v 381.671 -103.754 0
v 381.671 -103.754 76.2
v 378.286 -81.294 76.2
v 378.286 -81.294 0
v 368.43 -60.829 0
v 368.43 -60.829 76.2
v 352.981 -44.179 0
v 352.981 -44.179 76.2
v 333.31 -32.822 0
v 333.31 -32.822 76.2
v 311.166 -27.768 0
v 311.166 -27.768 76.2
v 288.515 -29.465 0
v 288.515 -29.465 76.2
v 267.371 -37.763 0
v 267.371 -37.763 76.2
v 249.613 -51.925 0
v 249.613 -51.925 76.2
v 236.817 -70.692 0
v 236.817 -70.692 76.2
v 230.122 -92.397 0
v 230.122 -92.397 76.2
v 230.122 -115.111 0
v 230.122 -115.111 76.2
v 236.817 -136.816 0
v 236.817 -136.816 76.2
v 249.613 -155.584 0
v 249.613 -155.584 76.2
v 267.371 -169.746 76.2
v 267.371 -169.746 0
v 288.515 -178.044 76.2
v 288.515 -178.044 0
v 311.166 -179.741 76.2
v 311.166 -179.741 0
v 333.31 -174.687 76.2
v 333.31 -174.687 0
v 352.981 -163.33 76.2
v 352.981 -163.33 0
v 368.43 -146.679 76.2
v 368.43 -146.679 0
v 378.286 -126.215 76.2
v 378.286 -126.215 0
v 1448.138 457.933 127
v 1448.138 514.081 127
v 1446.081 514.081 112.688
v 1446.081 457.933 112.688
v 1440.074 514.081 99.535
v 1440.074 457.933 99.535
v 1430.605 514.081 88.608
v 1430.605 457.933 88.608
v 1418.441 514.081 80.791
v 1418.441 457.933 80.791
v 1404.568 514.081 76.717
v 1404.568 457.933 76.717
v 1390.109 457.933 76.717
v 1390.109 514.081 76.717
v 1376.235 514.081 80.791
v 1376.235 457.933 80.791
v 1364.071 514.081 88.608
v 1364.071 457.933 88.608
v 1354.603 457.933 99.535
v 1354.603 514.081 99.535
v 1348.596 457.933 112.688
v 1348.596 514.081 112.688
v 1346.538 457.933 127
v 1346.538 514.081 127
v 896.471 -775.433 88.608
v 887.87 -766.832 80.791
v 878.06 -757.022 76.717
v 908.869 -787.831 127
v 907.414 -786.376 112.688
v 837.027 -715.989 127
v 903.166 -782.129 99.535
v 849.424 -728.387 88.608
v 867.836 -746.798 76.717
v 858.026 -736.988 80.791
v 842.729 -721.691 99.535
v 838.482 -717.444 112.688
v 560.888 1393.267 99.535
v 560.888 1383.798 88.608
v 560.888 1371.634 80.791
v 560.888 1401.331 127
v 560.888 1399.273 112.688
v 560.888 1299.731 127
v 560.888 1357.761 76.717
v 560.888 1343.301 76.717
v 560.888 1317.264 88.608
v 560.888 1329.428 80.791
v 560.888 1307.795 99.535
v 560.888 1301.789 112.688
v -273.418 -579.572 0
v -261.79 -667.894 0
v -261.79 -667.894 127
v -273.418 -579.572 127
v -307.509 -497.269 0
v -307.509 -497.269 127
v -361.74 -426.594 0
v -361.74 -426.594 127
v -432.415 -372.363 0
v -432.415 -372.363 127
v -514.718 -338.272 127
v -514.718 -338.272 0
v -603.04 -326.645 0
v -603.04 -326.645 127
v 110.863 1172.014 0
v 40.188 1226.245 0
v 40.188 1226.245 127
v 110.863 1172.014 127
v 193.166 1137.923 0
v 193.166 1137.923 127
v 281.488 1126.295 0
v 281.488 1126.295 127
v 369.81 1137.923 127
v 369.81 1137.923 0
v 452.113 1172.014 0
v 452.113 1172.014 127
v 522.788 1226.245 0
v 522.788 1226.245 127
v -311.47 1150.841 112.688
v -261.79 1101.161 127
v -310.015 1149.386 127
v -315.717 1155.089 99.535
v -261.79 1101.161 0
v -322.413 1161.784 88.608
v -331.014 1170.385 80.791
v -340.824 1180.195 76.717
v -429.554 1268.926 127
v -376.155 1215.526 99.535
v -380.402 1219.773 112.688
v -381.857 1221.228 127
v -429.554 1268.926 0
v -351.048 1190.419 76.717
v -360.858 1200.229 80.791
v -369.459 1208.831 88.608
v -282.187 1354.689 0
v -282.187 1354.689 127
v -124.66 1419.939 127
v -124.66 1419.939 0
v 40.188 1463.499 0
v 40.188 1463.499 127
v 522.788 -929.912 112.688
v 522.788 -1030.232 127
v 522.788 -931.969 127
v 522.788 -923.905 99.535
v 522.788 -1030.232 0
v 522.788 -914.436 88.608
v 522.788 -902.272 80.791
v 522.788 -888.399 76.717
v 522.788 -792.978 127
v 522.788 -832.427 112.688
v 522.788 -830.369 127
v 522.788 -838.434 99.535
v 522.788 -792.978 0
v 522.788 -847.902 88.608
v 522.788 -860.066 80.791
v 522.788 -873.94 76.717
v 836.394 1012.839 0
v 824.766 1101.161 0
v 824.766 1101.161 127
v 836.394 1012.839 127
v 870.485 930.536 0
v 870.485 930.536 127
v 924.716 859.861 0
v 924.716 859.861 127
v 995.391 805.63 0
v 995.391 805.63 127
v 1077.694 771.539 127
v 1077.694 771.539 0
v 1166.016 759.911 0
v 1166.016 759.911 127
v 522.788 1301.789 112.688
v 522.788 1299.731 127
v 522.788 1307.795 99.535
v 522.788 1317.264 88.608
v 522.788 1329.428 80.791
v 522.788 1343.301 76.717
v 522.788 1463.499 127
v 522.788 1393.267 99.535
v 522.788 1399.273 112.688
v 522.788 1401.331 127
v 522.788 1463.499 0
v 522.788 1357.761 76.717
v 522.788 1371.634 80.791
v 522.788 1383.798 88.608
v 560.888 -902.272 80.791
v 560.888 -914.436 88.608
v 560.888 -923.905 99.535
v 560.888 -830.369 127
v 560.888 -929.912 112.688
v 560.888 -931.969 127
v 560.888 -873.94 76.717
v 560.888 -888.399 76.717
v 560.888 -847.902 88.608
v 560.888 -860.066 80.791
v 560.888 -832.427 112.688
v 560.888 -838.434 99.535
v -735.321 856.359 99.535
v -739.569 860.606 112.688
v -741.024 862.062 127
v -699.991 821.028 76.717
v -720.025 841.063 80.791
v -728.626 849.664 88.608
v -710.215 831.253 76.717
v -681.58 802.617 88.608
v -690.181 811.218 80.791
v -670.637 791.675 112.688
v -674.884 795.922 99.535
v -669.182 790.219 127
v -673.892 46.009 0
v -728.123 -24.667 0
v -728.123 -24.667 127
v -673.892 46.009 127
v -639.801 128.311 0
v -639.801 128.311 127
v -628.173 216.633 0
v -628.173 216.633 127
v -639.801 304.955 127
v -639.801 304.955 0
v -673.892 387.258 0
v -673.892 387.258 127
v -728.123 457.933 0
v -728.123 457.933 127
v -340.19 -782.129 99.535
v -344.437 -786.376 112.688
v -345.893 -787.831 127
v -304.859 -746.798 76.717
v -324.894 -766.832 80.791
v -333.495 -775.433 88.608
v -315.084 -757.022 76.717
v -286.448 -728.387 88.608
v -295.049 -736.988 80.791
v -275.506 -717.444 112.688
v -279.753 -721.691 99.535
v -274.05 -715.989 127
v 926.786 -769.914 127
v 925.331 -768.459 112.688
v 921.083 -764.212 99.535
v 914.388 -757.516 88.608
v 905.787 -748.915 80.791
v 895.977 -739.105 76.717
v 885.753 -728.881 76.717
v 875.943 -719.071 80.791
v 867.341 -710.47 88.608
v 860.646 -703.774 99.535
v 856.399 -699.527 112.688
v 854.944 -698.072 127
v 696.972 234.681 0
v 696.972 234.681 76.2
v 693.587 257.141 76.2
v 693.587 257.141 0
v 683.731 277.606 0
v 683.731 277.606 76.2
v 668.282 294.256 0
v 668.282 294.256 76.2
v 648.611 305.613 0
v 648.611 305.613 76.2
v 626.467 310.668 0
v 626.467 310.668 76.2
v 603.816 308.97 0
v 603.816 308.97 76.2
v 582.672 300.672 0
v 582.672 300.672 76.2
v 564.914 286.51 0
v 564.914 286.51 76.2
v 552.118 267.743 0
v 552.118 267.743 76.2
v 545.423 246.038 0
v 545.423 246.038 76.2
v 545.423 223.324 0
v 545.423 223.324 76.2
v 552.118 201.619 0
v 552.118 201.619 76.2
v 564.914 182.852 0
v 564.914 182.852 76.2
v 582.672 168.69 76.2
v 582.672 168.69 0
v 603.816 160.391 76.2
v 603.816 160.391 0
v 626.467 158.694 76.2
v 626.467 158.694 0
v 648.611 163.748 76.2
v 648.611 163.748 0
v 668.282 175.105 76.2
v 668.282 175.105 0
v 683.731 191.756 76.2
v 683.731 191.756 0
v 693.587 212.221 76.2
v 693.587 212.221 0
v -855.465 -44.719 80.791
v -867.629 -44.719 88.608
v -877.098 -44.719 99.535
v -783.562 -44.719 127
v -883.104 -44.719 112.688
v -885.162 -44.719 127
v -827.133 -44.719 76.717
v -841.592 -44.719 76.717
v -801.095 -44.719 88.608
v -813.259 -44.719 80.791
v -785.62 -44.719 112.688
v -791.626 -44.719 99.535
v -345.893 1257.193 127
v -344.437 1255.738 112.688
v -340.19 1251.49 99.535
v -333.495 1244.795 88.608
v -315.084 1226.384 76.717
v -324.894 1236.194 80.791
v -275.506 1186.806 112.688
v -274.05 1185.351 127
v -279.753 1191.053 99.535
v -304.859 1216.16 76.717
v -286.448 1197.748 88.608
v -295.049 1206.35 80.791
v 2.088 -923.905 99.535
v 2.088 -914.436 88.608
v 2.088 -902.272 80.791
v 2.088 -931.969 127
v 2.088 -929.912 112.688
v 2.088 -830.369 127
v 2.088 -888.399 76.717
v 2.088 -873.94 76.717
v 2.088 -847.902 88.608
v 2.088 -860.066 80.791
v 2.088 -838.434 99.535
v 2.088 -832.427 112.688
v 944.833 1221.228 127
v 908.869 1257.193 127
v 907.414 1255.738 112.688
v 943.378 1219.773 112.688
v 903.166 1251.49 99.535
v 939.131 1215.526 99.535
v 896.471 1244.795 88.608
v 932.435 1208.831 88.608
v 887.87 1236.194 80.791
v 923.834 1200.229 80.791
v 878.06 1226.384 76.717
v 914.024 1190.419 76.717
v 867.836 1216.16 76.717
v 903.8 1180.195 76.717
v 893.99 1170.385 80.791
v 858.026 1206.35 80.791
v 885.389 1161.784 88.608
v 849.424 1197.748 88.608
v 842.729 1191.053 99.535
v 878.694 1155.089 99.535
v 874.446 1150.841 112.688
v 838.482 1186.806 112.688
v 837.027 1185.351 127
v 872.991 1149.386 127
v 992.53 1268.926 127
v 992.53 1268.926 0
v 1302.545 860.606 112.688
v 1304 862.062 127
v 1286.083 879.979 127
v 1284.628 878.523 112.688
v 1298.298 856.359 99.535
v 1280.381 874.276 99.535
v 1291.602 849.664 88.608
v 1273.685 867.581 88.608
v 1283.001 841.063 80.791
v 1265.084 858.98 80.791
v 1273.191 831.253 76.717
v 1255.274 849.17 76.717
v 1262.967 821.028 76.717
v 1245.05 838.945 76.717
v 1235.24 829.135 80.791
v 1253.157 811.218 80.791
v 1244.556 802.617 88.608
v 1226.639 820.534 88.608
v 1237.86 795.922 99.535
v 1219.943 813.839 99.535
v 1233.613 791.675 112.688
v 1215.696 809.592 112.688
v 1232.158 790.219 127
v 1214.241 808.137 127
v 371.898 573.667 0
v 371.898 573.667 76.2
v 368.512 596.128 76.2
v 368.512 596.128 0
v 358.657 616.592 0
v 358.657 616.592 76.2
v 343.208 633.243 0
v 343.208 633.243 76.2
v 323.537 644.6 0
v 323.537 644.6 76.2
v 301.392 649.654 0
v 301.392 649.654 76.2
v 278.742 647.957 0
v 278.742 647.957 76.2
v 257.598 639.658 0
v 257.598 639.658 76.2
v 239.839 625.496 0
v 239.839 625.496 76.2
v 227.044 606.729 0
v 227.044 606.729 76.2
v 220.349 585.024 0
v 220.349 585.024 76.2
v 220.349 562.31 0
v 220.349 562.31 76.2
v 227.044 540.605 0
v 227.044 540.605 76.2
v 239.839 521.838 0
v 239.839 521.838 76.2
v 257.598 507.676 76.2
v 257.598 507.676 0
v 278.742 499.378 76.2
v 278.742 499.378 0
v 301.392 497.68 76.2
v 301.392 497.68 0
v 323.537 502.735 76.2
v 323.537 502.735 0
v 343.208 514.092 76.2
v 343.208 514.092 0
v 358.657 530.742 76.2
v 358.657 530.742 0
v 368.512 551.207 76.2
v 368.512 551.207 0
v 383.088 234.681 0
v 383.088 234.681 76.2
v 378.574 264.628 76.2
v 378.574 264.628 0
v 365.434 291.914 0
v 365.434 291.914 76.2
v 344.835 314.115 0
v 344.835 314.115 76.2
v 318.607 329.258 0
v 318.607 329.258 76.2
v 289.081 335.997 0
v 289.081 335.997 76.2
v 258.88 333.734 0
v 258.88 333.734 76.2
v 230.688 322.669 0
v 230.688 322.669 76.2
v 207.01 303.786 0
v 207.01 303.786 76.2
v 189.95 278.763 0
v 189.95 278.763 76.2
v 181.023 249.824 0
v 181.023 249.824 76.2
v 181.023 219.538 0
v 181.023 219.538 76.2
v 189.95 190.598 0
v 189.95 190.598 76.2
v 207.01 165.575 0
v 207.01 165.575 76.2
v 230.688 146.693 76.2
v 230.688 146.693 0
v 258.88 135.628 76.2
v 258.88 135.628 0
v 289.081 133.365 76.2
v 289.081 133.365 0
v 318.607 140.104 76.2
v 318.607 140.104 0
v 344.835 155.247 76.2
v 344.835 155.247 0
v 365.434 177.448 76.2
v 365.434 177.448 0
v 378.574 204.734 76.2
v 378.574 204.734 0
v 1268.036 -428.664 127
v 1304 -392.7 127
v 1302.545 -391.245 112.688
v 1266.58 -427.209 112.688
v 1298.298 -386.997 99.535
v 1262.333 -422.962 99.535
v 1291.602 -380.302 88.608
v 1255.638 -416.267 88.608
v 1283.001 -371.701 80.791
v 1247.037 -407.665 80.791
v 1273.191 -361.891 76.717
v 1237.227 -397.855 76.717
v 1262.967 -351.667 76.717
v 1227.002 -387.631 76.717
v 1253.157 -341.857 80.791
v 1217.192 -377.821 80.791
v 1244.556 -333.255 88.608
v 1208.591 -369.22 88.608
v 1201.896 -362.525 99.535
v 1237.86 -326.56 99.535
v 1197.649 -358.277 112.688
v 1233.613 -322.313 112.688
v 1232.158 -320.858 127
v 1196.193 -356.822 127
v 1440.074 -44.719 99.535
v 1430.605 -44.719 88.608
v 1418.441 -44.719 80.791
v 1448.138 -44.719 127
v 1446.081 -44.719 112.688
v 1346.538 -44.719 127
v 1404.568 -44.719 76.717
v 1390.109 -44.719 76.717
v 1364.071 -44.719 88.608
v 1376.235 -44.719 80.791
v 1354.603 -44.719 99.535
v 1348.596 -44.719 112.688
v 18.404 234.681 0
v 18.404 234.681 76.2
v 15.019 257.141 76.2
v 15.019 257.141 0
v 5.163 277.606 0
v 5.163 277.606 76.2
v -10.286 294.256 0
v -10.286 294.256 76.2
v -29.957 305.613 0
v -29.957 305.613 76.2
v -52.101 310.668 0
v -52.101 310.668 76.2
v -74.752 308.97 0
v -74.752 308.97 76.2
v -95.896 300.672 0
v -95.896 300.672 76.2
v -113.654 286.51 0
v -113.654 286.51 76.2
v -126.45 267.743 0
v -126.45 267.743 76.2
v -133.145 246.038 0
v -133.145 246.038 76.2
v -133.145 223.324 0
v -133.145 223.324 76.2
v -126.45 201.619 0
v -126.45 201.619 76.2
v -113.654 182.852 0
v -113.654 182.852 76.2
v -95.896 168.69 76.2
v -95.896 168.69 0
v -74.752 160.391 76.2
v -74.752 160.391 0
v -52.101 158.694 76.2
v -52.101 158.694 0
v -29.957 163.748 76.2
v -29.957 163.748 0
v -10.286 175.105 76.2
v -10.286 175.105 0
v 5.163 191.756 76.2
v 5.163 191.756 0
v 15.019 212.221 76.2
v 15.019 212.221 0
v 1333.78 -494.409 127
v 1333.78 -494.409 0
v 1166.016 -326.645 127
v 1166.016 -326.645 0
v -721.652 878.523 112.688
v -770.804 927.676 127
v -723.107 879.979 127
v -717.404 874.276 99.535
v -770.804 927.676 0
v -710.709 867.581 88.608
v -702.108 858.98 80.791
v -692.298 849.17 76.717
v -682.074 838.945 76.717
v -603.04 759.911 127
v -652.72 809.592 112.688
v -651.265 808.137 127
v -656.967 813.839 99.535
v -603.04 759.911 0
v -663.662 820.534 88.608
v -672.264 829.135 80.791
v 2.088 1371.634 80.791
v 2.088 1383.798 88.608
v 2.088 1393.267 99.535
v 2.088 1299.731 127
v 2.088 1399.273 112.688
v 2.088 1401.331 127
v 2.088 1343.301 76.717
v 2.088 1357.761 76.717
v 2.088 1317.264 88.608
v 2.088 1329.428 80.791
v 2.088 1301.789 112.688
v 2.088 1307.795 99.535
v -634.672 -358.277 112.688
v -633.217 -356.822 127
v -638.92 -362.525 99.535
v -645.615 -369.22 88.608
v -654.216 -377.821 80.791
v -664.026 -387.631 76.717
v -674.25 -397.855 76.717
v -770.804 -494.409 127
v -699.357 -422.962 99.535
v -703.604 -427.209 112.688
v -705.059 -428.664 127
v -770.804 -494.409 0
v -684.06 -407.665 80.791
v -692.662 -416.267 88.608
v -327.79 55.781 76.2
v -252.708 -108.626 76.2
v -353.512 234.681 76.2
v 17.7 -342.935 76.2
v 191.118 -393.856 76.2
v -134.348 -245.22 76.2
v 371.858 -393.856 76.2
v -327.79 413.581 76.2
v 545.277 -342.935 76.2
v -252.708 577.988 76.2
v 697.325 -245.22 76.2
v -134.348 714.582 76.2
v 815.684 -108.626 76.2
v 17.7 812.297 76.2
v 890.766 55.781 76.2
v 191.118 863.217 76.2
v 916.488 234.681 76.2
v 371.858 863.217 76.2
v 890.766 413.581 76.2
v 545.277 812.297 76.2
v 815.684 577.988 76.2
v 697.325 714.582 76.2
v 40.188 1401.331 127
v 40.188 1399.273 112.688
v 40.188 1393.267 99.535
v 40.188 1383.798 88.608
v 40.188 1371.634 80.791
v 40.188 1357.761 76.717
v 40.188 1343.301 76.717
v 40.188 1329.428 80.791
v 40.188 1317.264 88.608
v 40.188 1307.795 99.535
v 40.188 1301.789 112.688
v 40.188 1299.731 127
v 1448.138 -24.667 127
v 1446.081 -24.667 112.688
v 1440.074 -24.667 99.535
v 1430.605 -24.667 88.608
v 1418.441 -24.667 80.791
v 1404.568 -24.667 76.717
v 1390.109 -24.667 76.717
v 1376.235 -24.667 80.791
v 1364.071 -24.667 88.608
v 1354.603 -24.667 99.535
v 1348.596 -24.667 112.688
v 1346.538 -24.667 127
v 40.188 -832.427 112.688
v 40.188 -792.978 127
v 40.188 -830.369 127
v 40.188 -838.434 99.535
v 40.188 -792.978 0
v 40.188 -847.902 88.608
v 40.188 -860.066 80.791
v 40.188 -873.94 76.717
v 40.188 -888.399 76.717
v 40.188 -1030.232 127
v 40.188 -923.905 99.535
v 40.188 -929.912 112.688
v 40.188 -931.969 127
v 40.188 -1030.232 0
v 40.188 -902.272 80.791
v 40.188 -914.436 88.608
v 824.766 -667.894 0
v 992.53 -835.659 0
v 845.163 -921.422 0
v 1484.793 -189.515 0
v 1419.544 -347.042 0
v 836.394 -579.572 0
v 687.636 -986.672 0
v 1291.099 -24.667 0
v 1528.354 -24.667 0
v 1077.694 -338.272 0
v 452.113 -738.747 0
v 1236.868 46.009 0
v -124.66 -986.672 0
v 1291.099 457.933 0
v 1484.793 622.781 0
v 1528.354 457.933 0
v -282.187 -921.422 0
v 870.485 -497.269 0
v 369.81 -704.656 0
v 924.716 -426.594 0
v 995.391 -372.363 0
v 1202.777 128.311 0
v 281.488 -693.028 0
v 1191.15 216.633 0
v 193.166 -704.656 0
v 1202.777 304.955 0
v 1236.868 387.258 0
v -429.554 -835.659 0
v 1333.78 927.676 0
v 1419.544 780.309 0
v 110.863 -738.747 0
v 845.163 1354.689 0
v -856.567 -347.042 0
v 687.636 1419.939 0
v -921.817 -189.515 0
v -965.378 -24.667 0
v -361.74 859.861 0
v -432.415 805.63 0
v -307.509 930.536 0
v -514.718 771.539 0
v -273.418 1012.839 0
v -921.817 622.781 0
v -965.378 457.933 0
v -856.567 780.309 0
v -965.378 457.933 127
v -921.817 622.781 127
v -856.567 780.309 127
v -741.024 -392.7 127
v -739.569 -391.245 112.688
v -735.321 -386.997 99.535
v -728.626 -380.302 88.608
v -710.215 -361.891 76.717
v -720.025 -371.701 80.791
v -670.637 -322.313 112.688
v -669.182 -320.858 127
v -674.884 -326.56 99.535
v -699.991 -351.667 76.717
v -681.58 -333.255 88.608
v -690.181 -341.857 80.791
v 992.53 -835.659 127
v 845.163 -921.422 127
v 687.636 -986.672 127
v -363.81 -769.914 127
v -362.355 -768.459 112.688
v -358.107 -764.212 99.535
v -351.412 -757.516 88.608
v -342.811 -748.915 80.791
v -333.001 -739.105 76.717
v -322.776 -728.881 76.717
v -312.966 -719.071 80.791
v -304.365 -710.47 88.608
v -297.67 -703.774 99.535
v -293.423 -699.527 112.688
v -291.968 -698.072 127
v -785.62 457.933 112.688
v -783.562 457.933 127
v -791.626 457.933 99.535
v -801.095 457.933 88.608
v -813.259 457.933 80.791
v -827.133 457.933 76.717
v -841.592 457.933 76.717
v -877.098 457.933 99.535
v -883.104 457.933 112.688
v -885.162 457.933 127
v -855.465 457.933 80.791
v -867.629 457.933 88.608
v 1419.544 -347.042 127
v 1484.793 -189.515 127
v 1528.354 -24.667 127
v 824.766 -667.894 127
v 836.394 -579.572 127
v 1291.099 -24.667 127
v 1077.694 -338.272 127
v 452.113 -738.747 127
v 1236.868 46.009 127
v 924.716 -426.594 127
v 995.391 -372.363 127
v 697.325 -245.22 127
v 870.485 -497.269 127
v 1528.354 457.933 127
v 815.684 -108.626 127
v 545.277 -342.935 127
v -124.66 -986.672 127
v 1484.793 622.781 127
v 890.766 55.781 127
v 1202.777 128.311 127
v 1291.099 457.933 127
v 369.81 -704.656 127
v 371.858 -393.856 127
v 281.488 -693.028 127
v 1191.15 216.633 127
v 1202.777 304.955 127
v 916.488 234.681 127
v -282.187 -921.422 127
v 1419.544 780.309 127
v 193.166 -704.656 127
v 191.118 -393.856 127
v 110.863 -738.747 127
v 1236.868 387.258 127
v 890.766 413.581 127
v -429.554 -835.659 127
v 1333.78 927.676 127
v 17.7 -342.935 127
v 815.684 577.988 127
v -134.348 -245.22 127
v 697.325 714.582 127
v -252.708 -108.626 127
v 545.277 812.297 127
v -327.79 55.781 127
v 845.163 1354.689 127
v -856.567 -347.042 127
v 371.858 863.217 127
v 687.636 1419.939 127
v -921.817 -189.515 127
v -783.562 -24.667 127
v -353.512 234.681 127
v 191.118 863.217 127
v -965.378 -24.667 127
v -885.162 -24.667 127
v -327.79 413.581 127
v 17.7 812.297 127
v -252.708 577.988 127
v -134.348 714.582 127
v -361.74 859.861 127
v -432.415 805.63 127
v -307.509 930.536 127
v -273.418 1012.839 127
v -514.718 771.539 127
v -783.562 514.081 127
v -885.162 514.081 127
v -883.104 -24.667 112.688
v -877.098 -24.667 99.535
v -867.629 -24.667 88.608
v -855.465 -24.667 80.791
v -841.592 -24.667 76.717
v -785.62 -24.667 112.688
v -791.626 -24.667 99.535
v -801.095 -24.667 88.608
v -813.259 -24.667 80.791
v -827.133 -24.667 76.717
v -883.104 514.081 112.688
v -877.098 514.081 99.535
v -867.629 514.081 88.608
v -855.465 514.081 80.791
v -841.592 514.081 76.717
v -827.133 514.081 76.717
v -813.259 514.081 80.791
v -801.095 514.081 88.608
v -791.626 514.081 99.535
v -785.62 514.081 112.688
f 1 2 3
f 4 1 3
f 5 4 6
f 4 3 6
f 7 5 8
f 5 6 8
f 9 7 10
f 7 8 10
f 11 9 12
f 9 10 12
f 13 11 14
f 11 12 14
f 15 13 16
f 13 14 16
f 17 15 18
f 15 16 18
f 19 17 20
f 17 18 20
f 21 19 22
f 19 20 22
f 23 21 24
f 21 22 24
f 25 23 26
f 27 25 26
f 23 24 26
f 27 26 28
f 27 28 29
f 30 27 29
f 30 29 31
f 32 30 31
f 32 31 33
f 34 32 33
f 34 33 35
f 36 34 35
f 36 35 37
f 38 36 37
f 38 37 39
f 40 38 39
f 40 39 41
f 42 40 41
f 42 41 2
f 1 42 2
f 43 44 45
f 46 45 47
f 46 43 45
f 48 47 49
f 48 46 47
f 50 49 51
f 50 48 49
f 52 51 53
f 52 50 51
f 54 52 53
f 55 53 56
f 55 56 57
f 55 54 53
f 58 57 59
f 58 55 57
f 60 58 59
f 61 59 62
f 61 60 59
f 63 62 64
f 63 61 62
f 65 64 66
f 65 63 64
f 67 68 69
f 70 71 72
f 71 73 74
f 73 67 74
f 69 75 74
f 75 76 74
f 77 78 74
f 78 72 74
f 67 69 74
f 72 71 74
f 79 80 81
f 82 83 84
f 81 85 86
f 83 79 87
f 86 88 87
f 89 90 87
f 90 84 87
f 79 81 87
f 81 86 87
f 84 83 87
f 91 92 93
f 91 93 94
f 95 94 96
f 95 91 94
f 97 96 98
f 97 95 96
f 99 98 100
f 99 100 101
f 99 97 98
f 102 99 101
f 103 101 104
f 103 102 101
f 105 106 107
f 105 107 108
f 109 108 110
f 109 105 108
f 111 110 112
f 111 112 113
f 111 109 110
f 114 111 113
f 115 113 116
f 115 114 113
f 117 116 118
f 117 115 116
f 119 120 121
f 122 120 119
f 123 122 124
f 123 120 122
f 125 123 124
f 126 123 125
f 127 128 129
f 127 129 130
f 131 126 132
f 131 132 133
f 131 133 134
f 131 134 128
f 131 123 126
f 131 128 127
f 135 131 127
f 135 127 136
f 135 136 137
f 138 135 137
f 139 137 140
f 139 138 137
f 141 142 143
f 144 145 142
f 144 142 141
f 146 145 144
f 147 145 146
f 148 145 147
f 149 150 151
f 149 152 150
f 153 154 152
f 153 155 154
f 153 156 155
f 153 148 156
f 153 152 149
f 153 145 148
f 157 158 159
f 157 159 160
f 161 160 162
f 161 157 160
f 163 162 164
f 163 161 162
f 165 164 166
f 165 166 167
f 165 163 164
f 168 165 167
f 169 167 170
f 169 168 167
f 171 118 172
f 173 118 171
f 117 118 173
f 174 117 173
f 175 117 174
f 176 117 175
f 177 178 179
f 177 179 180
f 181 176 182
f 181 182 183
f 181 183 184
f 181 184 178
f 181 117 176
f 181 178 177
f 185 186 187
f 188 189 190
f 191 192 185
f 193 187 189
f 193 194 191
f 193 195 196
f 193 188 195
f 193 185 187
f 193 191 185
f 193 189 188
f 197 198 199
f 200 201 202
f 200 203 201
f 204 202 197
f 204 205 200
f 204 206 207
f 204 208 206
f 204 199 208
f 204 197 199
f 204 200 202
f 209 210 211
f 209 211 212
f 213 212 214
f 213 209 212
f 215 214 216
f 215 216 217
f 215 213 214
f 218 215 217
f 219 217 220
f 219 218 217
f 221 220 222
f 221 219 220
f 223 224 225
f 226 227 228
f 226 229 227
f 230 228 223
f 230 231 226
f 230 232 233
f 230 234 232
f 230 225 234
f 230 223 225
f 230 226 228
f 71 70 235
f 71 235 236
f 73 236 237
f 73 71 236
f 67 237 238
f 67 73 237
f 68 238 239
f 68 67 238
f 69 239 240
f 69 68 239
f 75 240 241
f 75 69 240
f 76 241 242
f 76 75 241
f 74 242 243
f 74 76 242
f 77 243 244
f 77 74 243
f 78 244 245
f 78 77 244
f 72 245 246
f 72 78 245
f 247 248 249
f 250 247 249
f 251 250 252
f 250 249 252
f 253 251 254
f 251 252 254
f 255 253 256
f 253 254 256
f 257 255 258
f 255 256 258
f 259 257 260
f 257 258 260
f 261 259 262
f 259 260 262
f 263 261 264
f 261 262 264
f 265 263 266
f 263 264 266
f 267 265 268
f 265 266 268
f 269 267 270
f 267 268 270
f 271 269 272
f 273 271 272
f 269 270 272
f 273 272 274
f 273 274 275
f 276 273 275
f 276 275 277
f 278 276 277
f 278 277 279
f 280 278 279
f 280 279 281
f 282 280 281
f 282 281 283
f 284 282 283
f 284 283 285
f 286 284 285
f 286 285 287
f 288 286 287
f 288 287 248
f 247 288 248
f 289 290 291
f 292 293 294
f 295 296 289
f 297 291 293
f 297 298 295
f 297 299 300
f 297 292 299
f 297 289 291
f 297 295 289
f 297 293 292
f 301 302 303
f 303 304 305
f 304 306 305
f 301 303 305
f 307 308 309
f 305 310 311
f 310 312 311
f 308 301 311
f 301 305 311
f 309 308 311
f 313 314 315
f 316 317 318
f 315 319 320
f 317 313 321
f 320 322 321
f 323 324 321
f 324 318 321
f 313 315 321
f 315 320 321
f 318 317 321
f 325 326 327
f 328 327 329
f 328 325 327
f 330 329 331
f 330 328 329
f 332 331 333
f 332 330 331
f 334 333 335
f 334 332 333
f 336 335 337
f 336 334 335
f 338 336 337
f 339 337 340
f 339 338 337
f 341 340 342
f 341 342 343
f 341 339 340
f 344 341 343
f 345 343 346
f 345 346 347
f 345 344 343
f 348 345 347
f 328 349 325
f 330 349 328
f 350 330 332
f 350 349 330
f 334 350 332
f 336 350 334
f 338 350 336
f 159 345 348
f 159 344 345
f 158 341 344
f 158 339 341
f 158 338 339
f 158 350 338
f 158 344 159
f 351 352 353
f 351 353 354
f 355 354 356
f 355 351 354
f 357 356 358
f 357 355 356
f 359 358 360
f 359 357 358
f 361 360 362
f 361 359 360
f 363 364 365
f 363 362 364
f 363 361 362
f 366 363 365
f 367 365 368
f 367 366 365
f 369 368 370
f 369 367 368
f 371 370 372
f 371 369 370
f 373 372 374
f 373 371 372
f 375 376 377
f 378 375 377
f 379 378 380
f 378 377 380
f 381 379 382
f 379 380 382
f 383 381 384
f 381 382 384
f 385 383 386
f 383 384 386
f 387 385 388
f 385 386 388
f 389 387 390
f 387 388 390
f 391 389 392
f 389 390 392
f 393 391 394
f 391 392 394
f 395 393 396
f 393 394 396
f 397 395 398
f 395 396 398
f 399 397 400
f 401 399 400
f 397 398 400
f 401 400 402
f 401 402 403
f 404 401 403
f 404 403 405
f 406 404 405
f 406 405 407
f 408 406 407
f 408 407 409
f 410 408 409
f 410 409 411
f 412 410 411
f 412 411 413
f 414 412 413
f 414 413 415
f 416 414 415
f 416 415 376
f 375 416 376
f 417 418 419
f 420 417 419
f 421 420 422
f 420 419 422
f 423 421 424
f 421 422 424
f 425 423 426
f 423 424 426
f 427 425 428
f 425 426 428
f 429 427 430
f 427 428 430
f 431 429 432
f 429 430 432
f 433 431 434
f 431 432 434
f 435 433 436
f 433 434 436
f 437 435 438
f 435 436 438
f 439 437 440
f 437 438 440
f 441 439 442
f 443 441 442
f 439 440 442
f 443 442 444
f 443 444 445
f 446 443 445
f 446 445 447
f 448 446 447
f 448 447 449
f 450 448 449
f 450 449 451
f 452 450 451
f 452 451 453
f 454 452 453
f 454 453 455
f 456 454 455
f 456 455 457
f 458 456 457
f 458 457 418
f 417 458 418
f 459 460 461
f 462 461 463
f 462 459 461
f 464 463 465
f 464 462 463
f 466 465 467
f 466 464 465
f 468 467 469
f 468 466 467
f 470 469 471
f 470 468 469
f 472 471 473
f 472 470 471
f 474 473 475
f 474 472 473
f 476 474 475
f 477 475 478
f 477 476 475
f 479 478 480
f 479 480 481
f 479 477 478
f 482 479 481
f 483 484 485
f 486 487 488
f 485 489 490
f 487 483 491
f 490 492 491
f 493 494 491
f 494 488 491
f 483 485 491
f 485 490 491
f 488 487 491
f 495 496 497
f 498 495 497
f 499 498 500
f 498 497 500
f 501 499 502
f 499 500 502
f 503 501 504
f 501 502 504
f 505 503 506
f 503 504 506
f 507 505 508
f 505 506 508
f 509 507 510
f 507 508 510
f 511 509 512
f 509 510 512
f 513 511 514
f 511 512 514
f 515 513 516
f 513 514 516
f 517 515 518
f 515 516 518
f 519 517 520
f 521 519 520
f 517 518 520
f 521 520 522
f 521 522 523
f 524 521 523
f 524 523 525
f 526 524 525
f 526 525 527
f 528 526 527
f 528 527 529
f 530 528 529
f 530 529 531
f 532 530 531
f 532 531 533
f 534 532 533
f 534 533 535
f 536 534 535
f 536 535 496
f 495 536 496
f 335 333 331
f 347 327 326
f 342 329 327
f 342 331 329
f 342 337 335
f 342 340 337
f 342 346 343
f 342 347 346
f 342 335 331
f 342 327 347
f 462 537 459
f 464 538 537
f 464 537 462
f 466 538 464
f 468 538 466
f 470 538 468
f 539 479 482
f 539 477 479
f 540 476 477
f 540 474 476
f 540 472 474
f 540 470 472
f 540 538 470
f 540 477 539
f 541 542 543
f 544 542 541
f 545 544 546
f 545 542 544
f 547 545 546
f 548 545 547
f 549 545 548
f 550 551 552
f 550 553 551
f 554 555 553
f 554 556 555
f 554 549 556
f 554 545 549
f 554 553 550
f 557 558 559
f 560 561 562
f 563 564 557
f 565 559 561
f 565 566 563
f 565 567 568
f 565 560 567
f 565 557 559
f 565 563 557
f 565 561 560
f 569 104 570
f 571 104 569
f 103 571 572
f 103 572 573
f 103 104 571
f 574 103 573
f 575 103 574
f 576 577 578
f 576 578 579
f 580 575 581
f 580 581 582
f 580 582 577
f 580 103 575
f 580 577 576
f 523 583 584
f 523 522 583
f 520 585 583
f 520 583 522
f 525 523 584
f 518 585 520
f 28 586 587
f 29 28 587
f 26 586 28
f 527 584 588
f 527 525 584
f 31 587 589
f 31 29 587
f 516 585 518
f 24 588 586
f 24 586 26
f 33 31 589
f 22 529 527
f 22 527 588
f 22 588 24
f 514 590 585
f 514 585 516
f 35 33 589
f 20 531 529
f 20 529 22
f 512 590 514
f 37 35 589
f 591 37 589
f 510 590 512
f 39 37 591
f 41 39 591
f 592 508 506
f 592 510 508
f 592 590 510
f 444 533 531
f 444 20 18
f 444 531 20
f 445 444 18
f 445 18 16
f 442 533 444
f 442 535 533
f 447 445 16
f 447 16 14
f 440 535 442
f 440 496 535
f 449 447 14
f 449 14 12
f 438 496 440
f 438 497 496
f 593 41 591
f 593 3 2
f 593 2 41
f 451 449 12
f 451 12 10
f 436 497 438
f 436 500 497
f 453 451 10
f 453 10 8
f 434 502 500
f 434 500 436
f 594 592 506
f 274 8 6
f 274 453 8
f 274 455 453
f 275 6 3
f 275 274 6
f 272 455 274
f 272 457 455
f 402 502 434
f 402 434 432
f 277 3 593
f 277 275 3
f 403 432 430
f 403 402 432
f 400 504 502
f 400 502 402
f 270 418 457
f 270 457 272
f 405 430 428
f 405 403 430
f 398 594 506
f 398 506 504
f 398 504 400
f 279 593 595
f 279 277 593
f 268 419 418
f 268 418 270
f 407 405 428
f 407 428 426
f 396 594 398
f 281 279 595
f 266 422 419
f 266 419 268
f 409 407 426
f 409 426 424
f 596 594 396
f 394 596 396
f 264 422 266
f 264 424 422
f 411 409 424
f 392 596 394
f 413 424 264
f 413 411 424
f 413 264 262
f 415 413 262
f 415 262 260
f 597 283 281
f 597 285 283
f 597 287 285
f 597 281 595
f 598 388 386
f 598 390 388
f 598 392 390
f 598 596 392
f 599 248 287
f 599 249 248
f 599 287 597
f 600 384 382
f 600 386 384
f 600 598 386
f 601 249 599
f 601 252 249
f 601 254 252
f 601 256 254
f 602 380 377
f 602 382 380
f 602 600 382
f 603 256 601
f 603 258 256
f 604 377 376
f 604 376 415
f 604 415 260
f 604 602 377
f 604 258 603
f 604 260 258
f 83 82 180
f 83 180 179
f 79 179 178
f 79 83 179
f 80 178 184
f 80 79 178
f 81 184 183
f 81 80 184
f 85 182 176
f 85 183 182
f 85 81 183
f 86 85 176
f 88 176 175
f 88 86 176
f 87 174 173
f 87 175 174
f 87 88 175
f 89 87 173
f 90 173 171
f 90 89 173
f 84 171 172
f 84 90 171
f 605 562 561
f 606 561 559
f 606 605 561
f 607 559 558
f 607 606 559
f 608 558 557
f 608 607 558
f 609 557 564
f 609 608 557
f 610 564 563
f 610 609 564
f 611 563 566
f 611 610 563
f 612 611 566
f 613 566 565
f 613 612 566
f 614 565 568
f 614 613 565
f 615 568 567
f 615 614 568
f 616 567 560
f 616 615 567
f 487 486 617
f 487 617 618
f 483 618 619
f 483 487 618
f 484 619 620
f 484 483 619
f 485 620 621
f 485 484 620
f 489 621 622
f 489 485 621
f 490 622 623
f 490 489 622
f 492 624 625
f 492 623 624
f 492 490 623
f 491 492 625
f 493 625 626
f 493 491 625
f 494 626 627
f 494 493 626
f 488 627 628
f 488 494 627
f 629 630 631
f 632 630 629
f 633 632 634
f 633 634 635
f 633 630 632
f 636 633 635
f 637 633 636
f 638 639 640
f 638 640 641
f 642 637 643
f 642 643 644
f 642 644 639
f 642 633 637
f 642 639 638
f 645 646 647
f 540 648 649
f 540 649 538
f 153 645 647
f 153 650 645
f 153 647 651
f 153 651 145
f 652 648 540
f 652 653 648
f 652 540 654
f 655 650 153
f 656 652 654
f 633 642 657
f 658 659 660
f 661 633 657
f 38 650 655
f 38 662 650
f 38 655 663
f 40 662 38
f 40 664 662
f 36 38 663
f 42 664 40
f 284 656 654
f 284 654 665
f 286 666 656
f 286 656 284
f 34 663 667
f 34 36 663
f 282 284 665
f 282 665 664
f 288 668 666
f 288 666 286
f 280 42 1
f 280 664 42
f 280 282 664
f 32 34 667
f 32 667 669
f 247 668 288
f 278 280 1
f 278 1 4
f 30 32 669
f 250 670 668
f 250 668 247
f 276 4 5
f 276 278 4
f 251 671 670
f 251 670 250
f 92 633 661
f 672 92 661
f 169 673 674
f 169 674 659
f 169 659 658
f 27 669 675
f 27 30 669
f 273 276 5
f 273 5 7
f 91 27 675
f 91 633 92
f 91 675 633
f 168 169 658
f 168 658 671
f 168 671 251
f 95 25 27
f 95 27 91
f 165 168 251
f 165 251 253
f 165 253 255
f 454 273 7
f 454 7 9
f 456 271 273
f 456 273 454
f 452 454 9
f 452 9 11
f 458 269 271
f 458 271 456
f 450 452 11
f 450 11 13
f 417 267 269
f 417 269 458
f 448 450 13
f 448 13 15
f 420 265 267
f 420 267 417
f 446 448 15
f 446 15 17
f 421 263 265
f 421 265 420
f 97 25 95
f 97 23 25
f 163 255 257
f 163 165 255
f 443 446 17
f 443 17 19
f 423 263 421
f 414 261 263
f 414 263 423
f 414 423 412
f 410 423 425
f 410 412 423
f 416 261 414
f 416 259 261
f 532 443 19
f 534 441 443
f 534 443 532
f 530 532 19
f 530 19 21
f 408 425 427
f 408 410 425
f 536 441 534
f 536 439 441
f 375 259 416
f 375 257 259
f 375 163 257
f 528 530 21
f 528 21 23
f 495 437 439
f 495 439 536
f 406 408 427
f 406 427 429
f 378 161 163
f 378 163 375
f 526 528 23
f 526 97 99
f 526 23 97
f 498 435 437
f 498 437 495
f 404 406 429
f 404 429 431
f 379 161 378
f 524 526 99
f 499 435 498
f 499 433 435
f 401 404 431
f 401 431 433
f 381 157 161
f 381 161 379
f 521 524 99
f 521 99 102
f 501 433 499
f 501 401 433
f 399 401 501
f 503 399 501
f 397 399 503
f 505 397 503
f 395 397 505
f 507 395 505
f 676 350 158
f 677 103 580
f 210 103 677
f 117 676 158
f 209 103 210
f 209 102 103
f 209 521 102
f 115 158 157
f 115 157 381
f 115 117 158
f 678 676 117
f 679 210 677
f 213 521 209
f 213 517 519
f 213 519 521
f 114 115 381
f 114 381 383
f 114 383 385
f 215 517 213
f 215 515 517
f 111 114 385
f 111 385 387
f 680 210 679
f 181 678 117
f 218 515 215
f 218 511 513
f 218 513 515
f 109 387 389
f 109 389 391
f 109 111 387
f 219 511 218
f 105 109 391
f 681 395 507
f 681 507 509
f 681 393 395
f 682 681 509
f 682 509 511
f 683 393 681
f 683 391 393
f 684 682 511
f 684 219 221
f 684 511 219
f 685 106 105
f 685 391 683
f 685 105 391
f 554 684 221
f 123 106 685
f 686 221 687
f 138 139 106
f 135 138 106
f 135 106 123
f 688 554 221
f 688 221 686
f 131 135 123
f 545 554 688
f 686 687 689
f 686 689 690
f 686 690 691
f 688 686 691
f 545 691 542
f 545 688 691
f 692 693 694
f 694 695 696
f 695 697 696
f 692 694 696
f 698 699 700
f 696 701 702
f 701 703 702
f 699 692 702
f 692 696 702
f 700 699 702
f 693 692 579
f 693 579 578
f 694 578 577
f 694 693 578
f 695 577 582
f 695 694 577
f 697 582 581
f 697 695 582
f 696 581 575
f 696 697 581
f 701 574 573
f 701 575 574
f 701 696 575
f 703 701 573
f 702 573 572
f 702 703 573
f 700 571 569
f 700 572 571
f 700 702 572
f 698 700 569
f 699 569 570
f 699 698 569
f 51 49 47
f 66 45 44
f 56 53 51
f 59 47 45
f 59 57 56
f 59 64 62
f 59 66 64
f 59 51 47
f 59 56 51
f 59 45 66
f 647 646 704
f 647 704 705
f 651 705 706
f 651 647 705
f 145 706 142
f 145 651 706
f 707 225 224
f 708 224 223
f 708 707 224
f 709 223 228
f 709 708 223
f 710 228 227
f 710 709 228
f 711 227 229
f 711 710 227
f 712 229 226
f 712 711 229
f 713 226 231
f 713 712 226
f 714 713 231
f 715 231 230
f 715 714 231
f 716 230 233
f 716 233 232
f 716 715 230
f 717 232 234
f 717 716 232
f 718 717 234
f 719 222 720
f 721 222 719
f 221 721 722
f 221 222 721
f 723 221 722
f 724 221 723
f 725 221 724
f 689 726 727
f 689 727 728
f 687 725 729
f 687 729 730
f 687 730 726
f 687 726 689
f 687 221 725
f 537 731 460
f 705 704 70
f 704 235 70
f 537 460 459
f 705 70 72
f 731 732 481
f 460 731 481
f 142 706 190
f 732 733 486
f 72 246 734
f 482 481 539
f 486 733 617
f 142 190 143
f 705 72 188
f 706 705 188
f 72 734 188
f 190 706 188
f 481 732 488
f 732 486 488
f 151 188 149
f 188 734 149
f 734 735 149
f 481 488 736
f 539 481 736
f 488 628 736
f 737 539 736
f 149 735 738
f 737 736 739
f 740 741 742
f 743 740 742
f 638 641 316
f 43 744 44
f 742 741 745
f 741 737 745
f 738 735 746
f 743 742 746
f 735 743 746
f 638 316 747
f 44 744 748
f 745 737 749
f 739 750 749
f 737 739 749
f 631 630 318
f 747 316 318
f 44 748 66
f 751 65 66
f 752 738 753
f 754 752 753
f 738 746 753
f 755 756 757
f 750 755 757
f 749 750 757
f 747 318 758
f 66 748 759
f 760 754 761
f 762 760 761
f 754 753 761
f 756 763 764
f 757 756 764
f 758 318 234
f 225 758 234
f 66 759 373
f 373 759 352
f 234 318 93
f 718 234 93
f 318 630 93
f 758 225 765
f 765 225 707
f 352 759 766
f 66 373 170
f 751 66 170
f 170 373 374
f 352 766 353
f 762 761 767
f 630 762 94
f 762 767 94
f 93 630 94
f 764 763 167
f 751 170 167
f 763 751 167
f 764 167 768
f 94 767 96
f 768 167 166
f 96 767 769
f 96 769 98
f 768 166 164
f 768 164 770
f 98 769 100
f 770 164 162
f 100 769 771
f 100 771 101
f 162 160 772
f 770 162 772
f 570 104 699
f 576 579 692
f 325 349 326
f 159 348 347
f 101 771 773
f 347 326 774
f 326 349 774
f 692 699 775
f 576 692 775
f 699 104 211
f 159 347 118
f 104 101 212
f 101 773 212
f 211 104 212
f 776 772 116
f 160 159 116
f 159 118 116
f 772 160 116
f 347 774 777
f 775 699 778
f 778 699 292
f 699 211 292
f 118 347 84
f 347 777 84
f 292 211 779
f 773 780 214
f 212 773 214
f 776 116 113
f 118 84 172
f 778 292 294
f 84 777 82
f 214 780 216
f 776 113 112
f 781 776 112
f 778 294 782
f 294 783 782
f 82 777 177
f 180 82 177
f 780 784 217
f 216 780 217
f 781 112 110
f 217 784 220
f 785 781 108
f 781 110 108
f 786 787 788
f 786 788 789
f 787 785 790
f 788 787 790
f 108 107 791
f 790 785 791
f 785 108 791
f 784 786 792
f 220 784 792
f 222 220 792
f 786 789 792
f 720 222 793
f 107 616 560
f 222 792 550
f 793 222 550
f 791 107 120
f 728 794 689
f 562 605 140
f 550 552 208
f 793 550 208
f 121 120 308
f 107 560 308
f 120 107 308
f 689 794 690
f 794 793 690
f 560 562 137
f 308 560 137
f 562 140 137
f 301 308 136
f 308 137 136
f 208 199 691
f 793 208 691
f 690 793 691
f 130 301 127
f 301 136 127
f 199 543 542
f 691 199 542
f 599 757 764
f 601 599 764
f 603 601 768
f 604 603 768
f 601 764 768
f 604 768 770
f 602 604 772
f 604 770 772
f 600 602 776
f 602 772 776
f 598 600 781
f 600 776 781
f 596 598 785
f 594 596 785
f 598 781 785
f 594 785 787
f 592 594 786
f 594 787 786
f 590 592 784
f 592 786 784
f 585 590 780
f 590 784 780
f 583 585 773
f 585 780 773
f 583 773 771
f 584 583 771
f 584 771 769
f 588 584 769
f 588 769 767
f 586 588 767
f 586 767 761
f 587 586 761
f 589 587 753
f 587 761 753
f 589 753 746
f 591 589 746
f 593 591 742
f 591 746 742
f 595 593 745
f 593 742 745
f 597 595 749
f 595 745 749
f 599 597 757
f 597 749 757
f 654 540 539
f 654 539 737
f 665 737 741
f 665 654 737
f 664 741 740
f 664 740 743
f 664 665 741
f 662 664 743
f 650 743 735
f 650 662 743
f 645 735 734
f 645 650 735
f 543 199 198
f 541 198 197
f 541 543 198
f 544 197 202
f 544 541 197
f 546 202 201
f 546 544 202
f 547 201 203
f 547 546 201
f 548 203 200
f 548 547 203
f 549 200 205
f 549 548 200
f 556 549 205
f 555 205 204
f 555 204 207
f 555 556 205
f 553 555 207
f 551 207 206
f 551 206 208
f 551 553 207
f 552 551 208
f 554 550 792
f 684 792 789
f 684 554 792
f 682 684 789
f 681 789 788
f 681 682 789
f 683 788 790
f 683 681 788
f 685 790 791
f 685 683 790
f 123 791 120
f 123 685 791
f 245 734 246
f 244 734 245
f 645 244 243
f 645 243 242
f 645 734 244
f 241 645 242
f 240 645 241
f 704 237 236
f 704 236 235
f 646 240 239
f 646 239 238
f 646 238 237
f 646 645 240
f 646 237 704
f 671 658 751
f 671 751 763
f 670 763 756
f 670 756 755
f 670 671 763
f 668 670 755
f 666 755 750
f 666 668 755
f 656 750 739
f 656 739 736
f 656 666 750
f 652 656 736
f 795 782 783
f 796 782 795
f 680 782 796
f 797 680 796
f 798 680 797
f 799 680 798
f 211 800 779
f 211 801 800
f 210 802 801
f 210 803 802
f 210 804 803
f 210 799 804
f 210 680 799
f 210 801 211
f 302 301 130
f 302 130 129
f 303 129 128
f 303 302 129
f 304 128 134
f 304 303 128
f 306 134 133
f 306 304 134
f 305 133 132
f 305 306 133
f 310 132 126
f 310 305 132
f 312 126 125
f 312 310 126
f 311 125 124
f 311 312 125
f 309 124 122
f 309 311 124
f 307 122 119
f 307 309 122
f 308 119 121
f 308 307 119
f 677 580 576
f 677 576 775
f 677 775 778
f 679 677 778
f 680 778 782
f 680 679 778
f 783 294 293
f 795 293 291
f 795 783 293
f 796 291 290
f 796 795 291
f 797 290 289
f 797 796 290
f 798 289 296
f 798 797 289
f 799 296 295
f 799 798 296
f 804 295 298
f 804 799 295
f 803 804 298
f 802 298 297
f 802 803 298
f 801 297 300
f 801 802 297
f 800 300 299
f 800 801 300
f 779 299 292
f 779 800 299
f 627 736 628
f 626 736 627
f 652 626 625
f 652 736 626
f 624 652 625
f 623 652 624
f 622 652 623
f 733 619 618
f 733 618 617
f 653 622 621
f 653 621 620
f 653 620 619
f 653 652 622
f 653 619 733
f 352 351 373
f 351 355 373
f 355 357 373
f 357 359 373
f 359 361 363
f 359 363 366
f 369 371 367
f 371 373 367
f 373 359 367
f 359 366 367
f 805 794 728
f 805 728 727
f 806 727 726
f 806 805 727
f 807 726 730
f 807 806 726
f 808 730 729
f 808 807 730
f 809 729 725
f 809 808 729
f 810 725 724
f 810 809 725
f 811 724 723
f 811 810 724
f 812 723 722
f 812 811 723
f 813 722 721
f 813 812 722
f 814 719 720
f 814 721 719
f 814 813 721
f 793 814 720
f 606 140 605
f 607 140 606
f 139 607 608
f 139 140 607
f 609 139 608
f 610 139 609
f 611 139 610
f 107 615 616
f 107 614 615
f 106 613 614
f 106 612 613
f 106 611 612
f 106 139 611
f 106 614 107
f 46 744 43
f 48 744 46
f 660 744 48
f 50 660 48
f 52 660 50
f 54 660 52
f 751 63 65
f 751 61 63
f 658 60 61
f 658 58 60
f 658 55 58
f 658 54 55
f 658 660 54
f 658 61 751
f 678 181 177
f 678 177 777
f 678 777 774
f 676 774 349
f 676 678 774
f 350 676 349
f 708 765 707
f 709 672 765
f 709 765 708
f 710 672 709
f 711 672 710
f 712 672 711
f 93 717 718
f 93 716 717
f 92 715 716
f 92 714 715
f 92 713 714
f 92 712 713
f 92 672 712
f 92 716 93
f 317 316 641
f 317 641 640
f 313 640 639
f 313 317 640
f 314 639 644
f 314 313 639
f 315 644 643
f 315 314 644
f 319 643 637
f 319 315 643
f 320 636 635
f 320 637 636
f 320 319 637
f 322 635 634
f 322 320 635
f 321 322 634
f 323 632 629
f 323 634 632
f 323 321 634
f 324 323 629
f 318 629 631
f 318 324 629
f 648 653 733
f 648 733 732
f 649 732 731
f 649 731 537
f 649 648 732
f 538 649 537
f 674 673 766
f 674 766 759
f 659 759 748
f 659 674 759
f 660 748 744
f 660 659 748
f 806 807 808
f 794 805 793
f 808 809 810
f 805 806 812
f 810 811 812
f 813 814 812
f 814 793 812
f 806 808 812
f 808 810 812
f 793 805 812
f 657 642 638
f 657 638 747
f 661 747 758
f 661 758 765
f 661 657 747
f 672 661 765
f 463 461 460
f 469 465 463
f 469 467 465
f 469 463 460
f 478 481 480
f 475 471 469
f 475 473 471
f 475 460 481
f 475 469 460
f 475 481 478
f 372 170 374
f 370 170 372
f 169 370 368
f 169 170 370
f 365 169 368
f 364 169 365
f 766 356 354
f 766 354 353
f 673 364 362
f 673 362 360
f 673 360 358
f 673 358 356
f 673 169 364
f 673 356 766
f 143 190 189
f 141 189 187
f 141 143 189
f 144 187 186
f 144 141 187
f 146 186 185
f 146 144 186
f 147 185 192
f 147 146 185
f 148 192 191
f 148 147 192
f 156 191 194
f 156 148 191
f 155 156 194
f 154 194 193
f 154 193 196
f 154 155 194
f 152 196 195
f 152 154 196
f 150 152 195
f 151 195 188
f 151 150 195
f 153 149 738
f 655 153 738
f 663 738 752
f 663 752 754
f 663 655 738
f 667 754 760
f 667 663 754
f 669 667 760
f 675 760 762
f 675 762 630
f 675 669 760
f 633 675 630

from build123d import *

# Parameters (mm, degrees)
BOSS_EXTRUDE3_DEPTH = 127
SKETCH8_R           = 76.2
SKETCH8_R_2         = 101.6
CUT_EXTRUDE1_DEPTH  = 127
SKETCH9_R           = 635
CUT_EXTRUDE2_DEPTH  = 50.8
SKETCH11_W          = 558.8
SKETCH11_H          = 50.8
CIRPATTERN1_COUNT   = 8


with BuildPart() as part:
    # Sketch6 → Boss-Extrude3 (new body)
    with BuildSketch(Plane.XY):
        with BuildLine():
            Line((40.188095474, 1463.499220044), (40.188095474, 1226.244596849))
            ThreePointArc((40.188095474, 1226.244596849), (281.488095474, 1126.294864248), (522.788095474, 1226.244596849))
            Line((522.788095474, 1226.244596849), (522.788095474, 1463.499220044))
            ThreePointArc((522.788095474, 1463.499220044), (767.496054577, 1389.960431631), (992.530487837, 1268.925550305))
            Line((992.530487837, 1268.925550305), (824.766134908, 1101.161197376))
            ThreePointArc((824.766134908, 1101.161197376), (924.715867509, 859.861197376), (1166.015867509, 759.911464776))
            Line((1166.015867509, 759.911464776), (1333.780220438, 927.675817705))
            ThreePointArc((1333.780220438, 927.675817705), (1454.815101763, 702.641384445), (1528.353890176, 457.933425341))
            Line((1528.353890176, 457.933425341), (1291.099266981, 457.933425341))
            ThreePointArc((1291.099266981, 457.933425341), (1191.149534381, 216.633425341), (1291.099266981, -24.666574659))
            Line((1291.099266981, -24.666574659), (1528.353890176, -24.666574659))
            ThreePointArc((1528.353890176, -24.666574659), (1454.815101763, -269.374533762), (1333.780220438, -494.408967022))
            Line((1333.780220438, -494.408967022), (1166.015867509, -326.644614093))
            ThreePointArc((1166.015867509, -326.644614093), (924.715867509, -426.594346694), (824.766134908, -667.894346694))
            Line((824.766134908, -667.894346694), (992.530487837, -835.658699623))
            ThreePointArc((992.530487837, -835.658699623), (767.496054577, -956.693580948), (522.788095474, -1030.232369362))
            Line((522.788095474, -1030.232369362), (522.788095474, -792.977746166))
            ThreePointArc((522.788095474, -792.977746166), (281.488095474, -693.028013566), (40.188095474, -792.977746166))
            Line((40.188095474, -792.977746166), (40.188095474, -1030.232369362))
            ThreePointArc((40.188095474, -1030.232369362), (-204.51986363, -956.693580948), (-429.55429689, -835.658699623))
            Line((-429.55429689, -835.658699623), (-261.789943961, -667.894346694))
            ThreePointArc((-261.789943961, -667.894346694), (-361.739676561, -426.594346694), (-603.039676561, -326.644614093))
            Line((-603.039676561, -326.644614093), (-770.804029491, -494.408967022))
            ThreePointArc((-770.804029491, -494.408967022), (-891.838910816, -269.374533762), (-965.377699229, -24.666574659))
            Line((-965.377699229, -24.666574659), (-728.123076034, -24.666574659))
            ThreePointArc((-728.123076034, -24.666574659), (-628.173343433, 216.633425341), (-728.123076034, 457.933425341))
            Line((-728.123076034, 457.933425341), (-965.377699229, 457.933425341))
            ThreePointArc((-965.377699229, 457.933425341), (-891.838910816, 702.641384445), (-770.804029491, 927.675817705))
            Line((-770.804029491, 927.675817705), (-603.039676561, 759.911464776))
            ThreePointArc((-603.039676561, 759.911464776), (-361.739676561, 859.861197376), (-261.789943961, 1101.161197376))
            Line((-261.789943961, 1101.161197376), (-429.55429689, 1268.925550305))
            ThreePointArc((-429.55429689, 1268.925550305), (-204.51986363, 1389.960431631), (40.188095474, 1463.499220044))
        make_face()
    extrude(amount=BOSS_EXTRUDE3_DEPTH)

    # Sketch8 → Cut-Extrude1 (cut)
    with BuildSketch(Plane.XY.offset(127)):
        with Locations((295.6976207, 573.667181043)):
            Circle(SKETCH8_R)
        with Locations((305.471077412, -103.754429489)):
            Circle(SKETCH8_R)
        with Locations((-57.795904333, 234.680865806)):
            Circle(SKETCH8_R)
        with Locations((620.77209528, 234.680865806)):
            Circle(SKETCH8_R)
        with Locations((281.488095474, 234.680865806)):
            Circle(SKETCH8_R_2)
    extrude(amount=-CUT_EXTRUDE1_DEPTH, mode=Mode.SUBTRACT)

    # Sketch9 → Cut-Extrude2 (cut)
    with BuildSketch(Plane.XY.offset(127)):
        with Locations((281.488095474, 234.680865806)):
            Circle(SKETCH9_R)
    extrude(amount=-CUT_EXTRUDE2_DEPTH, mode=Mode.SUBTRACT)

    # Sketch11 → Cut-Revolve1 (revolve, cut)
    with BuildSketch(Plane.XY.offset(127)):
        with Locations((281.488095474, 1375.931069595)):
            Rectangle(SKETCH11_W, SKETCH11_H)
    cut_revolve1 = revolve(axis=Axis((560.888095474, 1350.531069595, 127), (-1, 0, 0)), mode=Mode.SUBTRACT)

    # CirPattern1: Cut-Revolve1 ×8 about axis
    cirpattern1_axis = Axis((281.488095474, 234.680865806, 0), (0, 0, 1))
    for i in range(1, CIRPATTERN1_COUNT):
        add(cut_revolve1.rotate(cirpattern1_axis, i * 360 / CIRPATTERN1_COUNT), mode=Mode.SUBTRACT)


solid = part.part
